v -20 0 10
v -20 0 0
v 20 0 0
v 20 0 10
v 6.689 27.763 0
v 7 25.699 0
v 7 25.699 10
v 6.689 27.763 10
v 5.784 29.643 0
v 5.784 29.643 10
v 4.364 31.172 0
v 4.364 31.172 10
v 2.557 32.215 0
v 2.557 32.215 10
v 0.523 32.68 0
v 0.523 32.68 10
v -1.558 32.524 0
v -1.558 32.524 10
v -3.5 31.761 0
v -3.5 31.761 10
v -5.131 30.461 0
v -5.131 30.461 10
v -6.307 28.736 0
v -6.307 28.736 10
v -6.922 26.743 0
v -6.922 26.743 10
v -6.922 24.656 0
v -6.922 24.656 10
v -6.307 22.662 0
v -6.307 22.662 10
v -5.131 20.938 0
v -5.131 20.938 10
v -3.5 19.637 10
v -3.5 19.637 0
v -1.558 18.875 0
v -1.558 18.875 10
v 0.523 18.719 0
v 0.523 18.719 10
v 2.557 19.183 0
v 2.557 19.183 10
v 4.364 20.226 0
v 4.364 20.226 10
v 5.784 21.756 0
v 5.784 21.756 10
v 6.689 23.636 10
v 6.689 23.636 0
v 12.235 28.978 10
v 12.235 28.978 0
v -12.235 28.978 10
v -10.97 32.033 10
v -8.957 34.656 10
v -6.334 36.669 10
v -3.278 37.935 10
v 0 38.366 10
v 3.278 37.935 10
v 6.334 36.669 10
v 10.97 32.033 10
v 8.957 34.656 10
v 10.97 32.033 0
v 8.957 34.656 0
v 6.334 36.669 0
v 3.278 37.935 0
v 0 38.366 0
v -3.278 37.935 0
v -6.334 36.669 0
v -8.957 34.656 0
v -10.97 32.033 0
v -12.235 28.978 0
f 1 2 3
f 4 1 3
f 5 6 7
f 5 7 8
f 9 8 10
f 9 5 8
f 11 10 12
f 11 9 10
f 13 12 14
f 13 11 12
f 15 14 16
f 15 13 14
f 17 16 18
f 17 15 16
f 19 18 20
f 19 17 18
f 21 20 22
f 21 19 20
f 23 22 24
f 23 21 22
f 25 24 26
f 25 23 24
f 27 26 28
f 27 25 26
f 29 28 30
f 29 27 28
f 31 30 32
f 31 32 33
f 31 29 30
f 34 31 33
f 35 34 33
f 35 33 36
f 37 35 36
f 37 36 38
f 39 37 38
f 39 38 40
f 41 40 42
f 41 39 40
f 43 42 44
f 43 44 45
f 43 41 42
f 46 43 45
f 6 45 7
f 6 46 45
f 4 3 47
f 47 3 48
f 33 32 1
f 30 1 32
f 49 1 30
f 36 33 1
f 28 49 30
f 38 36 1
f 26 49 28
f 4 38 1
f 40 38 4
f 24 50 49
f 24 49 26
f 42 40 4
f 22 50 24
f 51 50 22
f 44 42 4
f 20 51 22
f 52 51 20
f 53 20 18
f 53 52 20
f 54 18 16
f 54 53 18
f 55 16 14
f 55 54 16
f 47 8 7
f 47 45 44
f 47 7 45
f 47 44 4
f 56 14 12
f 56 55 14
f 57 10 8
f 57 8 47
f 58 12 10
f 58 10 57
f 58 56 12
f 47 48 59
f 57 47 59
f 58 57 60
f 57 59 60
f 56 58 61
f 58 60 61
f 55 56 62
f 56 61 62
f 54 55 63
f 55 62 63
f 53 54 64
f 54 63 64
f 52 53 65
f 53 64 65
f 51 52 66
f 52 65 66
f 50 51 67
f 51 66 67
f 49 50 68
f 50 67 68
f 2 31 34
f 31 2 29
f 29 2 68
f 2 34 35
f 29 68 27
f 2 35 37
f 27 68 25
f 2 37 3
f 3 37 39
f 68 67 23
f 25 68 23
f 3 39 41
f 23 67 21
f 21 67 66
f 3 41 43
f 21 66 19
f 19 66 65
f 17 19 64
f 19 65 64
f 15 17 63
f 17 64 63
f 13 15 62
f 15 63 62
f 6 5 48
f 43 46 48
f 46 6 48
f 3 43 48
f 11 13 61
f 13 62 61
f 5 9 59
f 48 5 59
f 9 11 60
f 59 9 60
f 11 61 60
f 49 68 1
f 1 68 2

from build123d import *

# Parameters (mm, degrees)
EXTRUDE_1_DEPTH     = 10
SKETCH_2_R          = 7
CUT_EXTRUDE_1_DEPTH = 10


with BuildPart() as part:
    # 草图1 → 凸台-拉伸1 (new body)
    with BuildSketch(Plane.XY):
        with BuildLine():
            Line((-20, 0), (20, 0))
            Line((20, 0), (12.235428647, 28.977774789))
            ThreePointArc((12.235428647, 28.977774789), (0, 38.366349399), (-12.235428647, 28.977774789))
            Line((-12.235428647, 28.977774789), (-20, 0))
        make_face()
    extrude(amount=EXTRUDE_1_DEPTH)

    # 草图2 → 切除-拉伸1 (cut)
    with BuildSketch(Plane.XY):
        with Locations((0, 25.699301564)):
            Circle(SKETCH_2_R)
    extrude(amount=CUT_EXTRUDE_1_DEPTH, mode=Mode.SUBTRACT)


solid = part.part
